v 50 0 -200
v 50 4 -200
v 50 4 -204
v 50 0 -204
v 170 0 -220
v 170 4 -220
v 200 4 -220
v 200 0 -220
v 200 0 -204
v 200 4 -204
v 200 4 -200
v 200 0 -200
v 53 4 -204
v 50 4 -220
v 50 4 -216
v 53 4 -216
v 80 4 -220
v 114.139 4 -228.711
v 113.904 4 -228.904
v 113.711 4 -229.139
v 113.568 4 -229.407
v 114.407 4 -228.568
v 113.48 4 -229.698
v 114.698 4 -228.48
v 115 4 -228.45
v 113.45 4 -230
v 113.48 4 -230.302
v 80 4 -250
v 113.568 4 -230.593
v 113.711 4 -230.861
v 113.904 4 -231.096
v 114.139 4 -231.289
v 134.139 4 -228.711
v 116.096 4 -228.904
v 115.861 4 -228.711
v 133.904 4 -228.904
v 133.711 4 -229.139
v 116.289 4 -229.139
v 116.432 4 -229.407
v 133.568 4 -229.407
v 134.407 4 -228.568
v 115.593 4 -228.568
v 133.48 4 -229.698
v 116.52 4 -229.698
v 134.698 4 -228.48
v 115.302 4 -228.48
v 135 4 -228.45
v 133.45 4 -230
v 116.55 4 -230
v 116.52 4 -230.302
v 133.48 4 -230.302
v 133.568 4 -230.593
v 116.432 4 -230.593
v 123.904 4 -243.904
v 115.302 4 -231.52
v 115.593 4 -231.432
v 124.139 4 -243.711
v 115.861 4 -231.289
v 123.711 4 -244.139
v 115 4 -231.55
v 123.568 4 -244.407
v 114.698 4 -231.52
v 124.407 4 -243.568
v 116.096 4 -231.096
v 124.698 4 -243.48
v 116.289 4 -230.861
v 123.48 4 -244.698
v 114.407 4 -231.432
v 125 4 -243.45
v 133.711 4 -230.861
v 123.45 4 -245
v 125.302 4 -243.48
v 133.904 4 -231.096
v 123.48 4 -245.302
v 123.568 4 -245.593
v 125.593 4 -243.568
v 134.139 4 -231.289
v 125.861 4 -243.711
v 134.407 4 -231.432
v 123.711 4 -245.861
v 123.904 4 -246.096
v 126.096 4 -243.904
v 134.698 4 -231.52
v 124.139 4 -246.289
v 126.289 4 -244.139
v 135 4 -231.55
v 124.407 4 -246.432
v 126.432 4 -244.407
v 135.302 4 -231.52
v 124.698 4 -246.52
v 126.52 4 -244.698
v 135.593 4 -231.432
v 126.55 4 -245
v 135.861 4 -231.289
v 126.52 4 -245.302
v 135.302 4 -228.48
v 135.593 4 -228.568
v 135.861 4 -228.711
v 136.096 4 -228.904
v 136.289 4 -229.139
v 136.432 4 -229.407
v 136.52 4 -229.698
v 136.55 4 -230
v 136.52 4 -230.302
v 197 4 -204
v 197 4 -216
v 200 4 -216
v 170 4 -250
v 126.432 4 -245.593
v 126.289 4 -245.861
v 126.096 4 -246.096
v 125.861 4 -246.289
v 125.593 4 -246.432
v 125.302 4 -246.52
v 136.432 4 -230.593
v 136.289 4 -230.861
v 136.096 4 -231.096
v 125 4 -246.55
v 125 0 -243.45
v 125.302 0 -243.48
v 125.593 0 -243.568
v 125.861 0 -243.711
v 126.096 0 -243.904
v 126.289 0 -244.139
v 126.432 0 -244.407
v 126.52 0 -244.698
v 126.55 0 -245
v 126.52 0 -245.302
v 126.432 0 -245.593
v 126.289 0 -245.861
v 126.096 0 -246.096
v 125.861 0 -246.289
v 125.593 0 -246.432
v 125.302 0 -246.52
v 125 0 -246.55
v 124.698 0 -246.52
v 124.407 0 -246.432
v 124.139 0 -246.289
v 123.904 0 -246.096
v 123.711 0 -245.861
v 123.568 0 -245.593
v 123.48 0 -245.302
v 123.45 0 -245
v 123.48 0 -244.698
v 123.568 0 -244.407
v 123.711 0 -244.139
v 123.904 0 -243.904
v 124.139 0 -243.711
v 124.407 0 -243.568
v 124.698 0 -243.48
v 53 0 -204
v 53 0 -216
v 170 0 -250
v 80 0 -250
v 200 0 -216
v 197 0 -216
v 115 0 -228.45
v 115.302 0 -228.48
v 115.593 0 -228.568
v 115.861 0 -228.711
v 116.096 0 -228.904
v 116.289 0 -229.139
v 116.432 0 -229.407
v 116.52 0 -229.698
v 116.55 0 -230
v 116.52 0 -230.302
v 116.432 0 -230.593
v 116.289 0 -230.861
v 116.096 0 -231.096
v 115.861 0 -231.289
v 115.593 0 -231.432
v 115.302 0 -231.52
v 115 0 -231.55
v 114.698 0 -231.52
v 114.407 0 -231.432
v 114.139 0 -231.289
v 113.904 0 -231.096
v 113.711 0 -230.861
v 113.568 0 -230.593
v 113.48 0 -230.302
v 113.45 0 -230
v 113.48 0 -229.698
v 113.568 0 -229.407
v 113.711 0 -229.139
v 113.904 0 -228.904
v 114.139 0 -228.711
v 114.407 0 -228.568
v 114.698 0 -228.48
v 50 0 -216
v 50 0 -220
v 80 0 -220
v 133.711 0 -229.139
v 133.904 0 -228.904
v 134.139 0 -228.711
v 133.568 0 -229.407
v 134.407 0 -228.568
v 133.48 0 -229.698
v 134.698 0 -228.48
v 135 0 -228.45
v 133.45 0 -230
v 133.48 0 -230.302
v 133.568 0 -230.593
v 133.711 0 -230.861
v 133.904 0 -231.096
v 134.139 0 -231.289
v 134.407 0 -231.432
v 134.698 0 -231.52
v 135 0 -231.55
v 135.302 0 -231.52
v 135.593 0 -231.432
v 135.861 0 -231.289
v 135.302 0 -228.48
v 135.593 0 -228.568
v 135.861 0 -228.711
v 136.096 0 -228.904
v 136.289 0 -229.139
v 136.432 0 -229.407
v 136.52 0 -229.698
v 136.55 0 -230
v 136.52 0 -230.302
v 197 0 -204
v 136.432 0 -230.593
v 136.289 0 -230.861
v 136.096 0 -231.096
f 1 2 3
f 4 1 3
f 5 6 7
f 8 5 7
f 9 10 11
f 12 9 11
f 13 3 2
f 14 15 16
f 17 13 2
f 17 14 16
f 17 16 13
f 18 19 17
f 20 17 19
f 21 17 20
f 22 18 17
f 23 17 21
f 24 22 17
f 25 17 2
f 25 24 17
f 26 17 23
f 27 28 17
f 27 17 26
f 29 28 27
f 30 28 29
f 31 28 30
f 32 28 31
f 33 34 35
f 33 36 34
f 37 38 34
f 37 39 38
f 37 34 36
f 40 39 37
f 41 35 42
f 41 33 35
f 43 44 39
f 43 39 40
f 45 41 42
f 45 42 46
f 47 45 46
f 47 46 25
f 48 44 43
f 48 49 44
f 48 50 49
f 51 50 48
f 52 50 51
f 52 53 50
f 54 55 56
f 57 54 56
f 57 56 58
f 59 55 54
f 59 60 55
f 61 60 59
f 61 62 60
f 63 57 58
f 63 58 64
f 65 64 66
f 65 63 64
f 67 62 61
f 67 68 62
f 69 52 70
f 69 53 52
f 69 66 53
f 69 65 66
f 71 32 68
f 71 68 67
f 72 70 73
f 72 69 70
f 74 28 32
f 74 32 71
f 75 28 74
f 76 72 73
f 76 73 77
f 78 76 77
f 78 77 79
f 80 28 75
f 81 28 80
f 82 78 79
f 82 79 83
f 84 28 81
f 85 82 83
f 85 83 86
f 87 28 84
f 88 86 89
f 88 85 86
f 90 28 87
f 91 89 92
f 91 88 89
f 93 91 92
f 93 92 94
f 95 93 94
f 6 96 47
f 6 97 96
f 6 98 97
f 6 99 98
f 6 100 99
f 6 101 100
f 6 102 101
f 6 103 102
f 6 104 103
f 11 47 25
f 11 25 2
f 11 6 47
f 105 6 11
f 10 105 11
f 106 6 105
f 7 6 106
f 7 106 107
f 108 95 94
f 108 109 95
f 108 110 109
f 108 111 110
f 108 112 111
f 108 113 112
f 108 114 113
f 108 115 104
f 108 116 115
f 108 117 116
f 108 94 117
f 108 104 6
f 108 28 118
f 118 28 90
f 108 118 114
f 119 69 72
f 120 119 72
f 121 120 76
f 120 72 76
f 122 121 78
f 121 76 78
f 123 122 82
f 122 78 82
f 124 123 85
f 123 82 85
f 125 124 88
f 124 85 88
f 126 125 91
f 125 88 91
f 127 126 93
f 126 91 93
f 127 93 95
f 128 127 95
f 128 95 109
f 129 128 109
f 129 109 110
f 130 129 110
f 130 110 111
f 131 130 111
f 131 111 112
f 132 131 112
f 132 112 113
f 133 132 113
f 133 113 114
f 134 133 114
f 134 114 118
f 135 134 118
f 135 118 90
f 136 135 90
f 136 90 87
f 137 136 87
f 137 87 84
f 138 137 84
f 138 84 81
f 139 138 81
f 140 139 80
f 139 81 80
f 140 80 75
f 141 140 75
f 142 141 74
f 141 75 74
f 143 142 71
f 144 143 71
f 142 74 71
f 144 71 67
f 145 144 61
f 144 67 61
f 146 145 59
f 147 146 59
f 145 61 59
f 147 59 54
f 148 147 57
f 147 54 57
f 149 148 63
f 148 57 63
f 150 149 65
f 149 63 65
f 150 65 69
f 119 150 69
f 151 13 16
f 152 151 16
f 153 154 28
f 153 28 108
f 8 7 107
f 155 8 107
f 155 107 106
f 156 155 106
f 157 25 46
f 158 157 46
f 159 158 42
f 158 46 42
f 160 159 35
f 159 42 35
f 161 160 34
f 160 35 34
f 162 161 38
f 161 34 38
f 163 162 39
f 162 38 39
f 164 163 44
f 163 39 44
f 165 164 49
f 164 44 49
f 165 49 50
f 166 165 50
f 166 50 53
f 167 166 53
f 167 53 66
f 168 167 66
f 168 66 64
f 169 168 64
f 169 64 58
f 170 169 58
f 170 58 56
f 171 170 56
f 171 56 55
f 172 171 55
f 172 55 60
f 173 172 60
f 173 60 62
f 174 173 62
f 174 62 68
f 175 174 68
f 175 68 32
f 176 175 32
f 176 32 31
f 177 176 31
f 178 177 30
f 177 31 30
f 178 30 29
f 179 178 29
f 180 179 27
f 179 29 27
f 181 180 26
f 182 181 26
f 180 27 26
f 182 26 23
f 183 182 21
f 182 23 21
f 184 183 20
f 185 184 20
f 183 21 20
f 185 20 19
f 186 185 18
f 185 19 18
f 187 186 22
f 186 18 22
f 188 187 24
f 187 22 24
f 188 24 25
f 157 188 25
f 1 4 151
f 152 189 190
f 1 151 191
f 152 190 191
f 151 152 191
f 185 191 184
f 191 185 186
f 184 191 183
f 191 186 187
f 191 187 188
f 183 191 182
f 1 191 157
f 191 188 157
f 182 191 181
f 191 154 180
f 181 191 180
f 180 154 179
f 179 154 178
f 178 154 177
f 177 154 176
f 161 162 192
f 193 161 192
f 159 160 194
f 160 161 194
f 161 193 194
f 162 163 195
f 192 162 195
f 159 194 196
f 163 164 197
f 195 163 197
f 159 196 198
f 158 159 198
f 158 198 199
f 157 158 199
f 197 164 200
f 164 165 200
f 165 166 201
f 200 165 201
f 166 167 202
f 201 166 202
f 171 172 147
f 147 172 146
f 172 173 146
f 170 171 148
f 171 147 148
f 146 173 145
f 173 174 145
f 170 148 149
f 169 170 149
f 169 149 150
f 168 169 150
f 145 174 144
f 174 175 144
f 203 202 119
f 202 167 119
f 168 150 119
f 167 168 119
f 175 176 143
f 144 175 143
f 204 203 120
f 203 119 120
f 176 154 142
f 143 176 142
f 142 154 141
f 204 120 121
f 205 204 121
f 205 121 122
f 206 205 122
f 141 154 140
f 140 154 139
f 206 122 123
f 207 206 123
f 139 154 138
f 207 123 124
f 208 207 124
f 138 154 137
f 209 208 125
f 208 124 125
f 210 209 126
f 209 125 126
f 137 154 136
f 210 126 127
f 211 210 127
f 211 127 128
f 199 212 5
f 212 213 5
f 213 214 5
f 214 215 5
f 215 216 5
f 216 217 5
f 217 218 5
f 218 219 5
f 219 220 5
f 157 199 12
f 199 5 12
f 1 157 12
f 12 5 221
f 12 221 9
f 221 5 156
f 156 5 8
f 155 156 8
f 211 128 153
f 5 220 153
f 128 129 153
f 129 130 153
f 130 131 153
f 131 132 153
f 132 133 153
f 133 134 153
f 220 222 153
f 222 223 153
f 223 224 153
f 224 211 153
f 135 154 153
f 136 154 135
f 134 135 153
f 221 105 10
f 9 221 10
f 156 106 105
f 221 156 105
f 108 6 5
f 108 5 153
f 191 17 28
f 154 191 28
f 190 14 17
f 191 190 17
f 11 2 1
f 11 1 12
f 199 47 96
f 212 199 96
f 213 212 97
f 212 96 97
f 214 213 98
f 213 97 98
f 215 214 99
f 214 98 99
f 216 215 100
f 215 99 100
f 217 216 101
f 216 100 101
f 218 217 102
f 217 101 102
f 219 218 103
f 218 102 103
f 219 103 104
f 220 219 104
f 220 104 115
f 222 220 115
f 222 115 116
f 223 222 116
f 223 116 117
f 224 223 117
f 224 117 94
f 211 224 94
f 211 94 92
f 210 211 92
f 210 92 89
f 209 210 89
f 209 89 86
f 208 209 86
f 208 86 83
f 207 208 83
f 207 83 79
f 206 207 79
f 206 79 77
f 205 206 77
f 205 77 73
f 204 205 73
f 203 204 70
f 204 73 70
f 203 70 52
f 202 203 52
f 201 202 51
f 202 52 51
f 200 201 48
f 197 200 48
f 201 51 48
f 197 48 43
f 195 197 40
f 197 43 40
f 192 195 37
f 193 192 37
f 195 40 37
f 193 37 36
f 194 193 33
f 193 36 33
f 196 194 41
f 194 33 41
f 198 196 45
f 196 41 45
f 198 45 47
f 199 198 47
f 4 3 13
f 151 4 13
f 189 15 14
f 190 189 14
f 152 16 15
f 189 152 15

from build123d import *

# Parameters (mm, degrees)
CROQUIS1_W              = 250
CROQUIS1_H              = 250
CROQUIS1_R              = 2.5
SALIENTE_EXTRUIR1_DEPTH = 4
CORTAR_EXTRUIR1_DEPTH   = 4
CROQUIS3_W              = 150
CROQUIS3_H              = 150
CROQUIS3_W_2            = 100
CROQUIS3_H_2            = 100
SALIENTE_EXTRUIR2_DEPTH = 4
CROQUIS4_R              = 1.55
CORTAR_EXTRUIR2_DEPTH   = 10
CROQUIS5_W              = 150
CROQUIS5_H              = 150
CROQUIS5_W_2            = 100
CROQUIS5_H_2            = 100
CORTAR_EXTRUIR3_DEPTH   = 10
CROQUIS6_W              = 30
CROQUIS6_H              = 50
CROQUIS6_W_2            = 50
CROQUIS6_H_2            = 30
CORTAR_EXTRUIR4_DEPTH   = 10
CROQUIS8_R              = 1.55
CORTAR_EXTRUIR5_DEPTH   = 10
CROQUIS9_R              = 2.5
CROQUIS9_R_2            = 1.55
CORTAR_EXTRUIR7_DEPTH   = 10
CORTAR_EXTRUIR8_DEPTH   = 10


with BuildPart() as part:
    # Croquis1 → Saliente-Extruir1 (new body)
    with BuildSketch(Plane(origin=(0, 0, 0), x_dir=(1, 0, 0), z_dir=(0, 1, 0))):
        with Locations((125, 125)):
            Rectangle(CROQUIS1_W, CROQUIS1_H)
        with Locations(Location((40, 210, 0), (0, 0, 270))):
            Circle(CROQUIS1_R, mode=Mode.SUBTRACT)
        with Locations(Location((210, 210, 0), (0, 0, 270))):
            Circle(CROQUIS1_R, mode=Mode.SUBTRACT)
        with Locations(Location((210, 40, 0), (0, 0, 270))):
            Circle(CROQUIS1_R, mode=Mode.SUBTRACT)
        with Locations(Location((40, 40, 0), (0, 0, 270))):
            Circle(CROQUIS1_R, mode=Mode.SUBTRACT)
    extrude(amount=SALIENTE_EXTRUIR1_DEPTH)

    # Croquis2 → Cortar-Extruir1 (cut)
    with BuildSketch(Plane(origin=(0, 4, 0), x_dir=(1, 0, 0), z_dir=(0, 1, 0))):
        Polygon((50, 50), (200, 50), (200, 200), (50, 200), (50, 150.09044268), align=None)
    extrude(amount=-CORTAR_EXTRUIR1_DEPTH, mode=Mode.SUBTRACT)

    # Croquis3 → Saliente-Extruir2 (add)
    with BuildSketch(Plane(origin=(0, 4, 0), x_dir=(1, 0, 0), z_dir=(0, 1, 0))):
        with Locations((125, 125)):
            Rectangle(CROQUIS3_W, CROQUIS3_H)
        with Locations((125, 125)):
            Rectangle(CROQUIS3_W_2, CROQUIS3_H_2, mode=Mode.SUBTRACT)
    extrude(amount=-SALIENTE_EXTRUIR2_DEPTH)

    # Croquis4 → Cortar-Extruir2 (cut)
    with BuildSketch(Plane(origin=(0, 4, 0), x_dir=(1, 0, 0), z_dir=(0, 1, 0))):
        with Locations(Location((115, 20, 0), (0, 0, 270))):
            Circle(CROQUIS4_R)
        with Locations(Location((135, 20, 0), (0, 0, 270))):
            Circle(CROQUIS4_R)
        with Locations(Location((125, 5, 0), (0, 0, 270))):
            Circle(CROQUIS4_R)
    extrude(amount=-CORTAR_EXTRUIR2_DEPTH, mode=Mode.SUBTRACT)

    # Croquis5 → Cortar-Extruir3 (cut)
    with BuildSketch(Plane(origin=(0, 4, 0), x_dir=(1, 0, 0), z_dir=(0, 1, 0))):
        with Locations((125, 125)):
            Rectangle(CROQUIS5_W, CROQUIS5_H)
        with Locations((125, 125)):
            Rectangle(CROQUIS5_W_2, CROQUIS5_H_2, mode=Mode.SUBTRACT)
    extrude(amount=-CORTAR_EXTRUIR3_DEPTH, mode=Mode.SUBTRACT)

    # Croquis6 → Cortar-Extruir4 (cut)
    with BuildSketch(Plane(origin=(0, 4, 0), x_dir=(1, 0, 0), z_dir=(0, 1, 0))):
        Polygon((170, 0), (250, 0), (250, 30), (220, 30), (170, 30), align=None)
        with Locations((235, 55)):
            Rectangle(CROQUIS6_W, CROQUIS6_H)
        Polygon((0, 80), (0, 0), (30, 0), (30, 30), (30, 80), align=None)
        with Locations((55, 15)):
            Rectangle(CROQUIS6_W_2, CROQUIS6_H_2)
        Polygon((80, 250), (0, 250), (0, 220), (30, 220), (80, 220), align=None)
        with Locations((15, 195)):
            Rectangle(CROQUIS6_W, CROQUIS6_H)
        Polygon((250, 170), (250, 250), (220, 250), (220, 220), (220, 170), align=None)
        with Locations((195, 235)):
            Rectangle(CROQUIS6_W_2, CROQUIS6_H_2)
    extrude(amount=-CORTAR_EXTRUIR4_DEPTH, mode=Mode.SUBTRACT)

    # Croquis8 → Cortar-Extruir5 (cut)
    with BuildSketch(Plane(origin=(0, 4, 0), x_dir=(1, 0, 0), z_dir=(0, 1, 0))):
        with Locations(Location((125, 5, 0), (0, 0, 270))):
            Circle(CROQUIS8_R)
        with Locations(Location((135, 20, 0), (0, 0, 270))):
            Circle(CROQUIS8_R)
        with Locations(Location((115, 20, 0), (0, 0, 270))):
            Circle(CROQUIS8_R)
        with Locations(Location((20, 135, 0), (0, 0, 270))):
            Circle(CROQUIS8_R)
        with Locations(Location((5, 125, 0), (0, 0, 270))):
            Circle(CROQUIS8_R)
        with Locations(Location((20, 115, 0), (0, 0, 270))):
            Circle(CROQUIS8_R)
        with Locations(Location((135, 230, 0), (0, 0, 270))):
            Circle(CROQUIS8_R)
        with Locations(Location((125, 245, 0), (0, 0, 270))):
            Circle(CROQUIS8_R)
        with Locations(Location((115, 230, 0), (0, 0, 270))):
            Circle(CROQUIS8_R)
        with Locations(Location((230, 115, 0), (0, 0, 270))):
            Circle(CROQUIS8_R)
        with Locations(Location((245, 125, 0), (0, 0, 270))):
            Circle(CROQUIS8_R)
        with Locations(Location((230, 135, 0), (0, 0, 270))):
            Circle(CROQUIS8_R)
    extrude(amount=-CORTAR_EXTRUIR5_DEPTH, mode=Mode.SUBTRACT)

    # Croquis9 → Cortar-Extruir7 (cut)
    # profile 1 of 2: a face of its own
    with BuildSketch(Plane(origin=(0, 4, 0), x_dir=(1, 0, 0), z_dir=(0, 1, 0))):
        Polygon((30, 30), (50, 30), (50, 34), (53, 34), (53, 46), (50, 46), (50, 50), (50, 200), (50, 204), (53, 204), (53, 216), (50, 216), (50, 220), (30, 220), (30, 170), (0, 170), (0, 80), (30, 80), align=None)
        with Locations((40, 40)):
            Circle(CROQUIS9_R, mode=Mode.SUBTRACT)
        with Locations((20, 115)):
            Circle(CROQUIS9_R_2, mode=Mode.SUBTRACT)
        with Locations((5, 125)):
            Circle(CROQUIS9_R_2, mode=Mode.SUBTRACT)
        with Locations((20, 135)):
            Circle(CROQUIS9_R_2, mode=Mode.SUBTRACT)
        with Locations((40, 210)):
            Circle(CROQUIS9_R, mode=Mode.SUBTRACT)
    # profile 2 of 2: a face of its own
    with BuildSketch(Plane(origin=(0, 4, 0), x_dir=(1, 0, 0), z_dir=(0, 1, 0))):
        Polygon((200, 0), (250, 0), (250, 250), (200, 250), (200, 216), (197, 216), (197, 204), (200, 204), (200, 46), (197, 46), (197, 34), (200, 34), align=None)
    extrude(amount=-CORTAR_EXTRUIR7_DEPTH, mode=Mode.SUBTRACT)


with BuildPart() as cortar_extruir7_piece_1:
    # of the separate pieces the step leaves, piece 1, a body of its own (cortar_extruir7_pieces)
    add(part.part.solids().sort_by_distance((80, 0, 0))[0])

    # Croquis10 → Cortar-Extruir8 (cut)
    with BuildSketch(Plane(origin=(0, 4, 0), x_dir=(1, 0, 0), z_dir=(0, 1, 0))):
        Polygon((200, 50), (50, 50), (50, 46), (53, 46), (53, 34), (50, 34), (50, 30), (80, 30), (80, 0), (170, 0), (170, 30), (200, 30), (200, 34), (197, 34), (197, 46), (200, 46), align=None)
    extrude(amount=-CORTAR_EXTRUIR8_DEPTH, mode=Mode.SUBTRACT)


with BuildPart() as cortar_extruir7_piece_2:
    # of the separate pieces the step leaves, piece 2, a body of its own (cortar_extruir7_pieces)
    add(part.part.solids().sort_by_distance((50, 0, -200))[0])


solid = cortar_extruir7_piece_2.part
